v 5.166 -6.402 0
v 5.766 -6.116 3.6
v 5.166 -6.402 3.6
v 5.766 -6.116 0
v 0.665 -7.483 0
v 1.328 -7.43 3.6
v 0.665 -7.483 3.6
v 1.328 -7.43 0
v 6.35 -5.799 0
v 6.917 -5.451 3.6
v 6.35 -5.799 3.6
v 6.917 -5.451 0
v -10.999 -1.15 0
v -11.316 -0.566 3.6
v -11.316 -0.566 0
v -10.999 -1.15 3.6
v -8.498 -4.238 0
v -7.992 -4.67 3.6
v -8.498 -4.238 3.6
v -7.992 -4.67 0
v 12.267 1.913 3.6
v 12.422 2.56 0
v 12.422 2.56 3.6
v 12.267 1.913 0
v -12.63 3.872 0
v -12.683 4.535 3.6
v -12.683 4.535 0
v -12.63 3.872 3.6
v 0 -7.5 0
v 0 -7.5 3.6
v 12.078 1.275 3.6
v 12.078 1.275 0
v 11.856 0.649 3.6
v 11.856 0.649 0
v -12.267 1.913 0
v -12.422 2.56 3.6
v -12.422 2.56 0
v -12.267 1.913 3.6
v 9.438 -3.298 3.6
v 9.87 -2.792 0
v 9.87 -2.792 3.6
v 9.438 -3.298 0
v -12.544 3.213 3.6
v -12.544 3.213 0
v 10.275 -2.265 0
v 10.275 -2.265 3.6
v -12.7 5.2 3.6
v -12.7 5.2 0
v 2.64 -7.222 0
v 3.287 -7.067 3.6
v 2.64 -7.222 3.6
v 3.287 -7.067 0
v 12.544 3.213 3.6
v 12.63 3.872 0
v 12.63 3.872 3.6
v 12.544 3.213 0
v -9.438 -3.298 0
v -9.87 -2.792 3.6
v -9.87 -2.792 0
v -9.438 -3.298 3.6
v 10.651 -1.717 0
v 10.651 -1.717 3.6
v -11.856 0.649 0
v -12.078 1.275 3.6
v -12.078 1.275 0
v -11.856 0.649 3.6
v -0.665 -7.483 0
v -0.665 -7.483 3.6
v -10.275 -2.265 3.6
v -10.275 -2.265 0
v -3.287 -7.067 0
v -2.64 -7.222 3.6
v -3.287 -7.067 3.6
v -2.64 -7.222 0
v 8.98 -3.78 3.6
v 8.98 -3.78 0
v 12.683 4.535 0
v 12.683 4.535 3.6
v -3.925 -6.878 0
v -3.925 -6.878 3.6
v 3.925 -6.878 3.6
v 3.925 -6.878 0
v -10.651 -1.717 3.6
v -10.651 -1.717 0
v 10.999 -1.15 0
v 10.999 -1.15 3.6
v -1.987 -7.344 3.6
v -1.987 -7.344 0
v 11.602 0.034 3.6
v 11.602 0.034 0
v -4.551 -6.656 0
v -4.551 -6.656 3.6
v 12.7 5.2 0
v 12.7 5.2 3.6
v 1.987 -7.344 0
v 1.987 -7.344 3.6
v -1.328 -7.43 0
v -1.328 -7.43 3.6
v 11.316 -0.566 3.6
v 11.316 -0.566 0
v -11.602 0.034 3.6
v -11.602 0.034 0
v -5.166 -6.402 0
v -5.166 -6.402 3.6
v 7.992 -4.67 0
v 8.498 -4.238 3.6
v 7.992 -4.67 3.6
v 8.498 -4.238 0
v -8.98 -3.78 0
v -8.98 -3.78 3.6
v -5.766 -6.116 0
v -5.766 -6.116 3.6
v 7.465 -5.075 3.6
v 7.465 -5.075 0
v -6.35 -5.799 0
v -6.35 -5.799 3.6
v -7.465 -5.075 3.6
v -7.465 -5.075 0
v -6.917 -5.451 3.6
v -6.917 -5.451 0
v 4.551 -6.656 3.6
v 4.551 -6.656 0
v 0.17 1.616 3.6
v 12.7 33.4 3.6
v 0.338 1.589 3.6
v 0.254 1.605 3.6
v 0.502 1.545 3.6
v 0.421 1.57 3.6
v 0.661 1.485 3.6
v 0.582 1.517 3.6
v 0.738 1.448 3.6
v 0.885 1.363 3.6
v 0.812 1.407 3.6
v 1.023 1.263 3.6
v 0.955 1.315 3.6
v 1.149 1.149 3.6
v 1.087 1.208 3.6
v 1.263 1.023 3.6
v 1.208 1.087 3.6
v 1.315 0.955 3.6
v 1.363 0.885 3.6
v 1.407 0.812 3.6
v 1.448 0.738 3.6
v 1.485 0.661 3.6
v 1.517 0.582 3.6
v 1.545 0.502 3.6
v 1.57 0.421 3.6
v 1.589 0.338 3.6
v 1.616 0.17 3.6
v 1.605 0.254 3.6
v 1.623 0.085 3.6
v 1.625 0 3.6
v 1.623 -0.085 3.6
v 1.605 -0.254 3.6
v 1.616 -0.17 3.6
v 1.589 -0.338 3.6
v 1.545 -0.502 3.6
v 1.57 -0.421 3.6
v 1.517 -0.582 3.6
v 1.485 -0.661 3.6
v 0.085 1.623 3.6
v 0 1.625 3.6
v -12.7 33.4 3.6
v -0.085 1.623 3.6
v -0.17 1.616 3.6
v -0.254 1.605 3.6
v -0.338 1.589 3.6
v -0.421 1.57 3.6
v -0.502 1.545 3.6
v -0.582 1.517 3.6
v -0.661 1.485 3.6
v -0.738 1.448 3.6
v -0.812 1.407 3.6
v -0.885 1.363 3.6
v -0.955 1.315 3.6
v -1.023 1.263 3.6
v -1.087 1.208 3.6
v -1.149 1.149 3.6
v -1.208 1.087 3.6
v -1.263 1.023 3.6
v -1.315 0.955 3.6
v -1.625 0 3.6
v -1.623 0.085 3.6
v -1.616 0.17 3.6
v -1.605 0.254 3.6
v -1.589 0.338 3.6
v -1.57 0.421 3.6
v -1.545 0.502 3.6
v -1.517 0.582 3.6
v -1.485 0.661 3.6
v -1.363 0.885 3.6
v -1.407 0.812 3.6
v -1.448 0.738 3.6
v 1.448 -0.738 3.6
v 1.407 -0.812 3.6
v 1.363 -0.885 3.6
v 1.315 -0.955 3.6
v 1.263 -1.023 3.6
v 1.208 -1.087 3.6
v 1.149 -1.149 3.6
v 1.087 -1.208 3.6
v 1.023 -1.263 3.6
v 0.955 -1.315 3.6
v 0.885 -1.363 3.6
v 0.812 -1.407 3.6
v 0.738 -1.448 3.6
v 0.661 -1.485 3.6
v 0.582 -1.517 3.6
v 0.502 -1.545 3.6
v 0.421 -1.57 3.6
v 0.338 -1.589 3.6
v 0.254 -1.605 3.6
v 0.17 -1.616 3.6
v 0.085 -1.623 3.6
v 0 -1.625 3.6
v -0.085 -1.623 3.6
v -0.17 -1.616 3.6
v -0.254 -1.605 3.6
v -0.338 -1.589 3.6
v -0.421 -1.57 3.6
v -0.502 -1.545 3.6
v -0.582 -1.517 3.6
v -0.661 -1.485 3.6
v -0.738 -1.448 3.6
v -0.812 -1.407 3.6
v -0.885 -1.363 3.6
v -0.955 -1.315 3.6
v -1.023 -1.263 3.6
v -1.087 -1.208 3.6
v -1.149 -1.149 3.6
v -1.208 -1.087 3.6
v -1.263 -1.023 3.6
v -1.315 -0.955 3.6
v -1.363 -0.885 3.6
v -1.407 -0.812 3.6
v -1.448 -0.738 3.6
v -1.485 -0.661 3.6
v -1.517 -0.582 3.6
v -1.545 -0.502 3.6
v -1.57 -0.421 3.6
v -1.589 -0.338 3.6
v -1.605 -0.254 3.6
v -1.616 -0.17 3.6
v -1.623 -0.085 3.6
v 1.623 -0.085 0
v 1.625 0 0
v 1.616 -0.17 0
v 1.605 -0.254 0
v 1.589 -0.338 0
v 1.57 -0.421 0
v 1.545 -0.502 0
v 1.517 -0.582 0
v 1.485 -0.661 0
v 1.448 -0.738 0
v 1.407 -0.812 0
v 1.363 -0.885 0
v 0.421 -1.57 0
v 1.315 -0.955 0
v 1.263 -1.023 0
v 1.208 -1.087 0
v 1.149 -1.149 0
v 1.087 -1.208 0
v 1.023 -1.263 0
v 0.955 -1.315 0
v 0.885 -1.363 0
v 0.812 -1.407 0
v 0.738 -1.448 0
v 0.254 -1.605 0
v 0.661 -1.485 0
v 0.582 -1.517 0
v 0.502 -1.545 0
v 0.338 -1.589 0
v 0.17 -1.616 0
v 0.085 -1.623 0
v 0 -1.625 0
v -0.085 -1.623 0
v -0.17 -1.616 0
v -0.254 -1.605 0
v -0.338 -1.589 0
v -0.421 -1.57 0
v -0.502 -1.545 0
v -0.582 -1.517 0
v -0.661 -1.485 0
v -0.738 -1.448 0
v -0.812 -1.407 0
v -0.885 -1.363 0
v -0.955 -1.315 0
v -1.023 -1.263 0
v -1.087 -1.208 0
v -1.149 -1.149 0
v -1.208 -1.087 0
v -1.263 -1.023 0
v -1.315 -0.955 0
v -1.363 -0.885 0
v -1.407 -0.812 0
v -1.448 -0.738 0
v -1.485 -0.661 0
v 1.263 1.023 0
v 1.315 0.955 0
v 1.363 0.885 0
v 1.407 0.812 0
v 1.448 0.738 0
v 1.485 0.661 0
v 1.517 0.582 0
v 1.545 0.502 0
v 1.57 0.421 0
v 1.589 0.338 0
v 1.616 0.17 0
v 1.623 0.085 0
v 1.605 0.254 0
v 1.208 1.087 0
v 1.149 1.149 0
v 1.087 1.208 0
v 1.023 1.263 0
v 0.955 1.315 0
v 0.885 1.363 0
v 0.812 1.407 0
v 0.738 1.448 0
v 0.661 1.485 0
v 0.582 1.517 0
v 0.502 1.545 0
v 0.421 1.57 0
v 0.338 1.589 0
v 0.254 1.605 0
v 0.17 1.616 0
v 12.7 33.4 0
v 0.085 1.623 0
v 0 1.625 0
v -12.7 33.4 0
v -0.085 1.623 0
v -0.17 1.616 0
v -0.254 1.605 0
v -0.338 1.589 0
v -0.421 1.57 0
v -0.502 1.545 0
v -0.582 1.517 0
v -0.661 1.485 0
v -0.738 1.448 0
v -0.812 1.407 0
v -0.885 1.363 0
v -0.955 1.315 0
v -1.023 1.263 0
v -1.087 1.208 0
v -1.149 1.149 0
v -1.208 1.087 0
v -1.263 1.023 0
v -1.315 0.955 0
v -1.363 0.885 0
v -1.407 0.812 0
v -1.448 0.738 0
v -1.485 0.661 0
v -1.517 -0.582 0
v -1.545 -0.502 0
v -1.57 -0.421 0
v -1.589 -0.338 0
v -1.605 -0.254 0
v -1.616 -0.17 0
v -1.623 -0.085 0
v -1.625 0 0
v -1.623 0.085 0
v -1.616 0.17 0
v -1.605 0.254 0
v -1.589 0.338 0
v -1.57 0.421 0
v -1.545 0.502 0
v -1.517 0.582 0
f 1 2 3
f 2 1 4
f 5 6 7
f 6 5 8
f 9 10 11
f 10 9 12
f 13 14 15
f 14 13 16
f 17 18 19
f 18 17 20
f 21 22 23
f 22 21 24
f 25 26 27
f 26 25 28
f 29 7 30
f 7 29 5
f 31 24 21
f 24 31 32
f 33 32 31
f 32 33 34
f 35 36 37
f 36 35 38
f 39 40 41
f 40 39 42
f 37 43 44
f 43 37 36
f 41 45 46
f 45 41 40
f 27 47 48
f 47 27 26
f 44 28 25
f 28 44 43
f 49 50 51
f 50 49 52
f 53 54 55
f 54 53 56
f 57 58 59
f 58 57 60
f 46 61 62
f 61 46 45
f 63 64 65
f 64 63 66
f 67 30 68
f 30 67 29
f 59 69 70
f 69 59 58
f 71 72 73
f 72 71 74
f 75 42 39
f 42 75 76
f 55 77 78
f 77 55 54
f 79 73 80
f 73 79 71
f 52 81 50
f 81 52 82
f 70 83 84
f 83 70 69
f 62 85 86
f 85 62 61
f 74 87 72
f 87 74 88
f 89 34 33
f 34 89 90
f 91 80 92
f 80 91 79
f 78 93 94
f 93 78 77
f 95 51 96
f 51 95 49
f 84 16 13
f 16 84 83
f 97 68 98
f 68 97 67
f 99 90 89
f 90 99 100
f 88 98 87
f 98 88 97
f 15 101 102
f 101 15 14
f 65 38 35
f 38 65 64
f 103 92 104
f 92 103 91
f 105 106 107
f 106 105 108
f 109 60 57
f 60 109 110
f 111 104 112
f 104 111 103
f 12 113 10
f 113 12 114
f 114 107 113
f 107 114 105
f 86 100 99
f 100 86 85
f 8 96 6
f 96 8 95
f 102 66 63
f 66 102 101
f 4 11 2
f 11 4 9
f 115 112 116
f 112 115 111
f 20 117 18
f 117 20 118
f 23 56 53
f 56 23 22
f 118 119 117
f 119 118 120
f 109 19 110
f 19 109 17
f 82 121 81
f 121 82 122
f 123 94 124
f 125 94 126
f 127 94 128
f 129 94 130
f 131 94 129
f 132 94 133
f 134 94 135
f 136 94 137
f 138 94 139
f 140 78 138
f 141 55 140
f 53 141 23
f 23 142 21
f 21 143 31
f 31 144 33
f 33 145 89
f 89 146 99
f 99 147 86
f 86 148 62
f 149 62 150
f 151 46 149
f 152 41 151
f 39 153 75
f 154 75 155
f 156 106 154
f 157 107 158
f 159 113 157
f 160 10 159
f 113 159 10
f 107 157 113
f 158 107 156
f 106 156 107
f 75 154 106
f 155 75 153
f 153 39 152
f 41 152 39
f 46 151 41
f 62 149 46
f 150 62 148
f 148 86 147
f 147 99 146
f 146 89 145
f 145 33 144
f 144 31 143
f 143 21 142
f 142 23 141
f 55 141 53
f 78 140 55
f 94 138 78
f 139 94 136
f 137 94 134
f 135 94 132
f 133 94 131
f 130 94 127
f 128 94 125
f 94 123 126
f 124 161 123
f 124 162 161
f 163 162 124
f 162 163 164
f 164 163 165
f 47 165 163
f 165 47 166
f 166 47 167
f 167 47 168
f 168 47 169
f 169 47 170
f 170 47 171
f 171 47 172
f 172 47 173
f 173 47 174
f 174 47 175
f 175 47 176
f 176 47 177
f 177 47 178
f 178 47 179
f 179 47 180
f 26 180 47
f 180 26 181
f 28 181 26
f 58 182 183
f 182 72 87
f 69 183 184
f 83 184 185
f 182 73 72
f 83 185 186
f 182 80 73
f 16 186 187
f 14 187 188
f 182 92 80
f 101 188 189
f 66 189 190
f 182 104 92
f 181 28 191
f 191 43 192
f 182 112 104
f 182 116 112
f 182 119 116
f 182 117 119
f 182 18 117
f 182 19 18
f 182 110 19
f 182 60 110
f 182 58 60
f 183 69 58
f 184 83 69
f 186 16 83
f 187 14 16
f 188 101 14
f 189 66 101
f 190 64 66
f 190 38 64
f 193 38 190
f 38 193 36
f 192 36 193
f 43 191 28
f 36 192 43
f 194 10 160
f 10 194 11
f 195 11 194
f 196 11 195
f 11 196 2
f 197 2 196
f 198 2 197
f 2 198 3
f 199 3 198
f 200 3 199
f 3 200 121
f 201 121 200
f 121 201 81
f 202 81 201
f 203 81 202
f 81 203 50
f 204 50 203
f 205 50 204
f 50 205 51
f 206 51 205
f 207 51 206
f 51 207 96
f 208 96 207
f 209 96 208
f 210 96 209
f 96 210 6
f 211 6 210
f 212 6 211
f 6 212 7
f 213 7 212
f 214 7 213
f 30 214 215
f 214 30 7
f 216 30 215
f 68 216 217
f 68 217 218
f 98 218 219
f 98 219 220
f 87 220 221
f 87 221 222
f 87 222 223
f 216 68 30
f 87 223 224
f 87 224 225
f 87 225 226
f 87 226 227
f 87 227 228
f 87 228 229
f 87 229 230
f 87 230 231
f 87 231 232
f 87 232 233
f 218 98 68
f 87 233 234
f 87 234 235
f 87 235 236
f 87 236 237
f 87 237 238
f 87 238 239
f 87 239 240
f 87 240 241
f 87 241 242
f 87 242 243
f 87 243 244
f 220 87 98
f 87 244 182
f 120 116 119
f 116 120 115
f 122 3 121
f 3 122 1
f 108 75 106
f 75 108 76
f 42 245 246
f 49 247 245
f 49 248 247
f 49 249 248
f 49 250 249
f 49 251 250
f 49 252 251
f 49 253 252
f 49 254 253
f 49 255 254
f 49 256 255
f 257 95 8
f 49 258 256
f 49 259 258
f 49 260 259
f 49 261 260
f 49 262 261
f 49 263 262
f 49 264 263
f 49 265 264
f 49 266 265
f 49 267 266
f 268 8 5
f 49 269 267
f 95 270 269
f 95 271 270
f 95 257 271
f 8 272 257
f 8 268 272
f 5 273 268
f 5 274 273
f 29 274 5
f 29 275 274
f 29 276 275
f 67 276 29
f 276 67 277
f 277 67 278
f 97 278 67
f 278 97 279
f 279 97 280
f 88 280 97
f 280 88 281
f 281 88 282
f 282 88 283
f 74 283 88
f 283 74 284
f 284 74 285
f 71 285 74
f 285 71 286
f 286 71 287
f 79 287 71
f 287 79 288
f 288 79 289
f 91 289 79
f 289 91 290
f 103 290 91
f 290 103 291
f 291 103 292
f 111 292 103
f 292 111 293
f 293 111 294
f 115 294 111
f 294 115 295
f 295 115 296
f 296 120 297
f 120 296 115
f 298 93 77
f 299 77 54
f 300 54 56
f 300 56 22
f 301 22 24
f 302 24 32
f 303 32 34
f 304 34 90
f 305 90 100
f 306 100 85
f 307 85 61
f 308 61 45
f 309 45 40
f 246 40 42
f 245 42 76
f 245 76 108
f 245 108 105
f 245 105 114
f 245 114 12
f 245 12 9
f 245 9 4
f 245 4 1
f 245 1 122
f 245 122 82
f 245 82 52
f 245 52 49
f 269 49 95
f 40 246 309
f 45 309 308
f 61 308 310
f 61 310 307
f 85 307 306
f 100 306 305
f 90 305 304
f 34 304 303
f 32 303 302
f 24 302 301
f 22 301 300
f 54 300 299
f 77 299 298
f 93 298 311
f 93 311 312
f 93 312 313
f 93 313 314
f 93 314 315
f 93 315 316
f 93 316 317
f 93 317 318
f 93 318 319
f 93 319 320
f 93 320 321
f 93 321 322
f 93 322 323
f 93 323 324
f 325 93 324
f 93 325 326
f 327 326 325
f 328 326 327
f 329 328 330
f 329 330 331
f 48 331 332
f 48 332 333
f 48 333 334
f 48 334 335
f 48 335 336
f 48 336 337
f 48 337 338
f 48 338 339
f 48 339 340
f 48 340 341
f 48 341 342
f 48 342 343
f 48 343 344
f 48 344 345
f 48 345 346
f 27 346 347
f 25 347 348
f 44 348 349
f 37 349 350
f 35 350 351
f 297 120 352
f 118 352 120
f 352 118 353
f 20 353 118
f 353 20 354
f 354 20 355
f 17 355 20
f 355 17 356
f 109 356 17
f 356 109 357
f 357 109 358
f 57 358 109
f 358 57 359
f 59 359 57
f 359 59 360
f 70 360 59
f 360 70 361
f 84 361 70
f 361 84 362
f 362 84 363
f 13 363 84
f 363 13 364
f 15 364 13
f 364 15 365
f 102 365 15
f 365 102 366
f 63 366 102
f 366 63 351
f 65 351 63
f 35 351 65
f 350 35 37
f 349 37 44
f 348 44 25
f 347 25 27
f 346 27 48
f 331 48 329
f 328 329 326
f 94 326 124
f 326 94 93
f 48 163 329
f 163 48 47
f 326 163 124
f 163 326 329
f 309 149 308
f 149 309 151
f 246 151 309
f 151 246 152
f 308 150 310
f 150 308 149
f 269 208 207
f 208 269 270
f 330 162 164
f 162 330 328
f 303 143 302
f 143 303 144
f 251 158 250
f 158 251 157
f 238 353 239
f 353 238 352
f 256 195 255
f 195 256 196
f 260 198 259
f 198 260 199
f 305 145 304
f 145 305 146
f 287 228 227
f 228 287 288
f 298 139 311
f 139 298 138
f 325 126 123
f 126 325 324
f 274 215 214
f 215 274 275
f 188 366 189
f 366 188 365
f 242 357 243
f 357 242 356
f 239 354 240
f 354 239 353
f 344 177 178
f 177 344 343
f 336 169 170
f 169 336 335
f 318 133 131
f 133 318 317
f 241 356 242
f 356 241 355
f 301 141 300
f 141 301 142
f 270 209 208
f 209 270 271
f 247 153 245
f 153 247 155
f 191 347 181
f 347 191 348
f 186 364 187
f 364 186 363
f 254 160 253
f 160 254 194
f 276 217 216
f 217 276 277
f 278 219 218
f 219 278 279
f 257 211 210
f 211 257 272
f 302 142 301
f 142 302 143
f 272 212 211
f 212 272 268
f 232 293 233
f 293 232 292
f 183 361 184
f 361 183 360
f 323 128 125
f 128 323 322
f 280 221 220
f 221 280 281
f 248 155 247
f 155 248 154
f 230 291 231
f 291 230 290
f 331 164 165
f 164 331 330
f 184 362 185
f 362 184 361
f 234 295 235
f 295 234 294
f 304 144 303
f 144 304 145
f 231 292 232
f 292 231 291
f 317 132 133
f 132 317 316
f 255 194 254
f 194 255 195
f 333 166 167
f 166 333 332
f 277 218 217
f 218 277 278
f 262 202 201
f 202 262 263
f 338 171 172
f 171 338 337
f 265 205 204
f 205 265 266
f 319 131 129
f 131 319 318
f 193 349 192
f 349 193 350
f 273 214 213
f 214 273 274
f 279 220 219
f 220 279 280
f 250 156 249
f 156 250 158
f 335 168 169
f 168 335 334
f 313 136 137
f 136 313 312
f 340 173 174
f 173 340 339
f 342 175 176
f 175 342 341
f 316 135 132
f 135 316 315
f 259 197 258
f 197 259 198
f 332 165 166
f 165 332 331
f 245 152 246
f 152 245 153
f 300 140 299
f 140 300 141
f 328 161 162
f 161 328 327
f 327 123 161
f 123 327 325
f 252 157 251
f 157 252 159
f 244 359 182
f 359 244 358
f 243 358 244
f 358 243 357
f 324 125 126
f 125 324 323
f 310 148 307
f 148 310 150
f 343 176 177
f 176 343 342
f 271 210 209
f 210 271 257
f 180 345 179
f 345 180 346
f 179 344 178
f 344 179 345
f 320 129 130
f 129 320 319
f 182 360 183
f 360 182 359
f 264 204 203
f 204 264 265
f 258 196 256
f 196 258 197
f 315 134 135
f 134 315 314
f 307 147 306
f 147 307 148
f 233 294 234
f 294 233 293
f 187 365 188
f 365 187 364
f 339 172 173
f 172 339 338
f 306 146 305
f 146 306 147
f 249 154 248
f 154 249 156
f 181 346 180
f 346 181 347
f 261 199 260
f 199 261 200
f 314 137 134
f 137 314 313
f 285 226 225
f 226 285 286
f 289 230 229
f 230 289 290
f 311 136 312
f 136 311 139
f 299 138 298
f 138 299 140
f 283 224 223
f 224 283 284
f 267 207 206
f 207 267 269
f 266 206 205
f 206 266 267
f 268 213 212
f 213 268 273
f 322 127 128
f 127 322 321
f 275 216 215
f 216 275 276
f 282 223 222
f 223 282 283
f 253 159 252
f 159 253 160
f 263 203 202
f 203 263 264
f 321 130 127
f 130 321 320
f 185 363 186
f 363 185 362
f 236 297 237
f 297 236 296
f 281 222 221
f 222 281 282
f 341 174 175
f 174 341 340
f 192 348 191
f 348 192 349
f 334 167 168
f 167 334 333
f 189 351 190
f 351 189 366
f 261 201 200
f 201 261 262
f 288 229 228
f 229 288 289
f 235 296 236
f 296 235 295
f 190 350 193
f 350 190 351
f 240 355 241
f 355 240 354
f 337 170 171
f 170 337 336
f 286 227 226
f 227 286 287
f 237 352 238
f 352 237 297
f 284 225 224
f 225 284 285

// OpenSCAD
// file: configuration.scad
// Increase this if your slicer or printer make holes too tight.
extra_radius = 0.0;

// OD = outside diameter, corner to corner.
m3_nut_od = 6.1;
m3_nut_radius = m3_nut_od/2 + 0.2 + extra_radius;
m3_washer_radius = 3.5 + extra_radius;

// Major diameter of metric 3mm thread.
m3_major = 2.85;
m3_radius = m3_major/2 + extra_radius;
m3_wide_radius = m3_major/2 + extra_radius + 0.2;

// NEMA17 stepper motors.
motor_shaft_diameter = 5;
motor_shaft_radius = motor_shaft_diameter/2 + extra_radius;

// Frame brackets. M3x8mm screws work best with 3.6 mm brackets.
thickness = 3.6;

// OpenBeam or Misumi. Currently only 15x15 mm, but there is a plan
// to make models more parametric and allow 20x20 mm in the future.
extrusion = 15;

// Placement for the NEMA17 stepper motors.
motor_offset = 44;
motor_length = 47;
// main file
include <configuration.scad>;

$fn=120;

sticky_width = 25.4;
sticky_length = 25.4;
sticky_offset = 8;  // Distance from screw center to glass edge.

// Make the round edge line up with the outside of OpenBeam.
screw_offset = sticky_width/2 - 7.5;
cube_length = sticky_length + sticky_offset - screw_offset;

module glass_tab() {
  difference() {
    translate([0, screw_offset, 0]) union() {
      cylinder(r=sticky_width/2, h=thickness, center=true);
      translate([0, cube_length/2, 0])
        cube([sticky_width, cube_length, thickness], center=true);
    }
    cylinder(r=m3_wide_radius, h=20, center=true);
  }
  // Scotch restickable tab for mounting.
  translate([0, sticky_length/2+sticky_offset, thickness/2]) %
    cube([sticky_width, sticky_length, 0.7], center=true);
  // Horizontal OpenBeam.
  translate([0, 0, (15+thickness)/-2]) %
    cube([100, 15, 15], center=true);
}

translate([0, 0, thickness/2]) glass_tab();
//translate([0, 170/2+6.8, thickness]) %cylinder(h=3, r=170/2);
difference(){
rotate([0,180,-90]) translate([-14.65, -12.76, -11])glass_clip();
//translate([0,0,12]) cylinder(h=10, r=3, center=true);
}

module glass_clip(){
// works in conjunction with tab
//import("Spiral+Bed+Clamp.STL", convexity=10);
//cylinder(r=sticky_width/2, h=thickness, center=true);

}
